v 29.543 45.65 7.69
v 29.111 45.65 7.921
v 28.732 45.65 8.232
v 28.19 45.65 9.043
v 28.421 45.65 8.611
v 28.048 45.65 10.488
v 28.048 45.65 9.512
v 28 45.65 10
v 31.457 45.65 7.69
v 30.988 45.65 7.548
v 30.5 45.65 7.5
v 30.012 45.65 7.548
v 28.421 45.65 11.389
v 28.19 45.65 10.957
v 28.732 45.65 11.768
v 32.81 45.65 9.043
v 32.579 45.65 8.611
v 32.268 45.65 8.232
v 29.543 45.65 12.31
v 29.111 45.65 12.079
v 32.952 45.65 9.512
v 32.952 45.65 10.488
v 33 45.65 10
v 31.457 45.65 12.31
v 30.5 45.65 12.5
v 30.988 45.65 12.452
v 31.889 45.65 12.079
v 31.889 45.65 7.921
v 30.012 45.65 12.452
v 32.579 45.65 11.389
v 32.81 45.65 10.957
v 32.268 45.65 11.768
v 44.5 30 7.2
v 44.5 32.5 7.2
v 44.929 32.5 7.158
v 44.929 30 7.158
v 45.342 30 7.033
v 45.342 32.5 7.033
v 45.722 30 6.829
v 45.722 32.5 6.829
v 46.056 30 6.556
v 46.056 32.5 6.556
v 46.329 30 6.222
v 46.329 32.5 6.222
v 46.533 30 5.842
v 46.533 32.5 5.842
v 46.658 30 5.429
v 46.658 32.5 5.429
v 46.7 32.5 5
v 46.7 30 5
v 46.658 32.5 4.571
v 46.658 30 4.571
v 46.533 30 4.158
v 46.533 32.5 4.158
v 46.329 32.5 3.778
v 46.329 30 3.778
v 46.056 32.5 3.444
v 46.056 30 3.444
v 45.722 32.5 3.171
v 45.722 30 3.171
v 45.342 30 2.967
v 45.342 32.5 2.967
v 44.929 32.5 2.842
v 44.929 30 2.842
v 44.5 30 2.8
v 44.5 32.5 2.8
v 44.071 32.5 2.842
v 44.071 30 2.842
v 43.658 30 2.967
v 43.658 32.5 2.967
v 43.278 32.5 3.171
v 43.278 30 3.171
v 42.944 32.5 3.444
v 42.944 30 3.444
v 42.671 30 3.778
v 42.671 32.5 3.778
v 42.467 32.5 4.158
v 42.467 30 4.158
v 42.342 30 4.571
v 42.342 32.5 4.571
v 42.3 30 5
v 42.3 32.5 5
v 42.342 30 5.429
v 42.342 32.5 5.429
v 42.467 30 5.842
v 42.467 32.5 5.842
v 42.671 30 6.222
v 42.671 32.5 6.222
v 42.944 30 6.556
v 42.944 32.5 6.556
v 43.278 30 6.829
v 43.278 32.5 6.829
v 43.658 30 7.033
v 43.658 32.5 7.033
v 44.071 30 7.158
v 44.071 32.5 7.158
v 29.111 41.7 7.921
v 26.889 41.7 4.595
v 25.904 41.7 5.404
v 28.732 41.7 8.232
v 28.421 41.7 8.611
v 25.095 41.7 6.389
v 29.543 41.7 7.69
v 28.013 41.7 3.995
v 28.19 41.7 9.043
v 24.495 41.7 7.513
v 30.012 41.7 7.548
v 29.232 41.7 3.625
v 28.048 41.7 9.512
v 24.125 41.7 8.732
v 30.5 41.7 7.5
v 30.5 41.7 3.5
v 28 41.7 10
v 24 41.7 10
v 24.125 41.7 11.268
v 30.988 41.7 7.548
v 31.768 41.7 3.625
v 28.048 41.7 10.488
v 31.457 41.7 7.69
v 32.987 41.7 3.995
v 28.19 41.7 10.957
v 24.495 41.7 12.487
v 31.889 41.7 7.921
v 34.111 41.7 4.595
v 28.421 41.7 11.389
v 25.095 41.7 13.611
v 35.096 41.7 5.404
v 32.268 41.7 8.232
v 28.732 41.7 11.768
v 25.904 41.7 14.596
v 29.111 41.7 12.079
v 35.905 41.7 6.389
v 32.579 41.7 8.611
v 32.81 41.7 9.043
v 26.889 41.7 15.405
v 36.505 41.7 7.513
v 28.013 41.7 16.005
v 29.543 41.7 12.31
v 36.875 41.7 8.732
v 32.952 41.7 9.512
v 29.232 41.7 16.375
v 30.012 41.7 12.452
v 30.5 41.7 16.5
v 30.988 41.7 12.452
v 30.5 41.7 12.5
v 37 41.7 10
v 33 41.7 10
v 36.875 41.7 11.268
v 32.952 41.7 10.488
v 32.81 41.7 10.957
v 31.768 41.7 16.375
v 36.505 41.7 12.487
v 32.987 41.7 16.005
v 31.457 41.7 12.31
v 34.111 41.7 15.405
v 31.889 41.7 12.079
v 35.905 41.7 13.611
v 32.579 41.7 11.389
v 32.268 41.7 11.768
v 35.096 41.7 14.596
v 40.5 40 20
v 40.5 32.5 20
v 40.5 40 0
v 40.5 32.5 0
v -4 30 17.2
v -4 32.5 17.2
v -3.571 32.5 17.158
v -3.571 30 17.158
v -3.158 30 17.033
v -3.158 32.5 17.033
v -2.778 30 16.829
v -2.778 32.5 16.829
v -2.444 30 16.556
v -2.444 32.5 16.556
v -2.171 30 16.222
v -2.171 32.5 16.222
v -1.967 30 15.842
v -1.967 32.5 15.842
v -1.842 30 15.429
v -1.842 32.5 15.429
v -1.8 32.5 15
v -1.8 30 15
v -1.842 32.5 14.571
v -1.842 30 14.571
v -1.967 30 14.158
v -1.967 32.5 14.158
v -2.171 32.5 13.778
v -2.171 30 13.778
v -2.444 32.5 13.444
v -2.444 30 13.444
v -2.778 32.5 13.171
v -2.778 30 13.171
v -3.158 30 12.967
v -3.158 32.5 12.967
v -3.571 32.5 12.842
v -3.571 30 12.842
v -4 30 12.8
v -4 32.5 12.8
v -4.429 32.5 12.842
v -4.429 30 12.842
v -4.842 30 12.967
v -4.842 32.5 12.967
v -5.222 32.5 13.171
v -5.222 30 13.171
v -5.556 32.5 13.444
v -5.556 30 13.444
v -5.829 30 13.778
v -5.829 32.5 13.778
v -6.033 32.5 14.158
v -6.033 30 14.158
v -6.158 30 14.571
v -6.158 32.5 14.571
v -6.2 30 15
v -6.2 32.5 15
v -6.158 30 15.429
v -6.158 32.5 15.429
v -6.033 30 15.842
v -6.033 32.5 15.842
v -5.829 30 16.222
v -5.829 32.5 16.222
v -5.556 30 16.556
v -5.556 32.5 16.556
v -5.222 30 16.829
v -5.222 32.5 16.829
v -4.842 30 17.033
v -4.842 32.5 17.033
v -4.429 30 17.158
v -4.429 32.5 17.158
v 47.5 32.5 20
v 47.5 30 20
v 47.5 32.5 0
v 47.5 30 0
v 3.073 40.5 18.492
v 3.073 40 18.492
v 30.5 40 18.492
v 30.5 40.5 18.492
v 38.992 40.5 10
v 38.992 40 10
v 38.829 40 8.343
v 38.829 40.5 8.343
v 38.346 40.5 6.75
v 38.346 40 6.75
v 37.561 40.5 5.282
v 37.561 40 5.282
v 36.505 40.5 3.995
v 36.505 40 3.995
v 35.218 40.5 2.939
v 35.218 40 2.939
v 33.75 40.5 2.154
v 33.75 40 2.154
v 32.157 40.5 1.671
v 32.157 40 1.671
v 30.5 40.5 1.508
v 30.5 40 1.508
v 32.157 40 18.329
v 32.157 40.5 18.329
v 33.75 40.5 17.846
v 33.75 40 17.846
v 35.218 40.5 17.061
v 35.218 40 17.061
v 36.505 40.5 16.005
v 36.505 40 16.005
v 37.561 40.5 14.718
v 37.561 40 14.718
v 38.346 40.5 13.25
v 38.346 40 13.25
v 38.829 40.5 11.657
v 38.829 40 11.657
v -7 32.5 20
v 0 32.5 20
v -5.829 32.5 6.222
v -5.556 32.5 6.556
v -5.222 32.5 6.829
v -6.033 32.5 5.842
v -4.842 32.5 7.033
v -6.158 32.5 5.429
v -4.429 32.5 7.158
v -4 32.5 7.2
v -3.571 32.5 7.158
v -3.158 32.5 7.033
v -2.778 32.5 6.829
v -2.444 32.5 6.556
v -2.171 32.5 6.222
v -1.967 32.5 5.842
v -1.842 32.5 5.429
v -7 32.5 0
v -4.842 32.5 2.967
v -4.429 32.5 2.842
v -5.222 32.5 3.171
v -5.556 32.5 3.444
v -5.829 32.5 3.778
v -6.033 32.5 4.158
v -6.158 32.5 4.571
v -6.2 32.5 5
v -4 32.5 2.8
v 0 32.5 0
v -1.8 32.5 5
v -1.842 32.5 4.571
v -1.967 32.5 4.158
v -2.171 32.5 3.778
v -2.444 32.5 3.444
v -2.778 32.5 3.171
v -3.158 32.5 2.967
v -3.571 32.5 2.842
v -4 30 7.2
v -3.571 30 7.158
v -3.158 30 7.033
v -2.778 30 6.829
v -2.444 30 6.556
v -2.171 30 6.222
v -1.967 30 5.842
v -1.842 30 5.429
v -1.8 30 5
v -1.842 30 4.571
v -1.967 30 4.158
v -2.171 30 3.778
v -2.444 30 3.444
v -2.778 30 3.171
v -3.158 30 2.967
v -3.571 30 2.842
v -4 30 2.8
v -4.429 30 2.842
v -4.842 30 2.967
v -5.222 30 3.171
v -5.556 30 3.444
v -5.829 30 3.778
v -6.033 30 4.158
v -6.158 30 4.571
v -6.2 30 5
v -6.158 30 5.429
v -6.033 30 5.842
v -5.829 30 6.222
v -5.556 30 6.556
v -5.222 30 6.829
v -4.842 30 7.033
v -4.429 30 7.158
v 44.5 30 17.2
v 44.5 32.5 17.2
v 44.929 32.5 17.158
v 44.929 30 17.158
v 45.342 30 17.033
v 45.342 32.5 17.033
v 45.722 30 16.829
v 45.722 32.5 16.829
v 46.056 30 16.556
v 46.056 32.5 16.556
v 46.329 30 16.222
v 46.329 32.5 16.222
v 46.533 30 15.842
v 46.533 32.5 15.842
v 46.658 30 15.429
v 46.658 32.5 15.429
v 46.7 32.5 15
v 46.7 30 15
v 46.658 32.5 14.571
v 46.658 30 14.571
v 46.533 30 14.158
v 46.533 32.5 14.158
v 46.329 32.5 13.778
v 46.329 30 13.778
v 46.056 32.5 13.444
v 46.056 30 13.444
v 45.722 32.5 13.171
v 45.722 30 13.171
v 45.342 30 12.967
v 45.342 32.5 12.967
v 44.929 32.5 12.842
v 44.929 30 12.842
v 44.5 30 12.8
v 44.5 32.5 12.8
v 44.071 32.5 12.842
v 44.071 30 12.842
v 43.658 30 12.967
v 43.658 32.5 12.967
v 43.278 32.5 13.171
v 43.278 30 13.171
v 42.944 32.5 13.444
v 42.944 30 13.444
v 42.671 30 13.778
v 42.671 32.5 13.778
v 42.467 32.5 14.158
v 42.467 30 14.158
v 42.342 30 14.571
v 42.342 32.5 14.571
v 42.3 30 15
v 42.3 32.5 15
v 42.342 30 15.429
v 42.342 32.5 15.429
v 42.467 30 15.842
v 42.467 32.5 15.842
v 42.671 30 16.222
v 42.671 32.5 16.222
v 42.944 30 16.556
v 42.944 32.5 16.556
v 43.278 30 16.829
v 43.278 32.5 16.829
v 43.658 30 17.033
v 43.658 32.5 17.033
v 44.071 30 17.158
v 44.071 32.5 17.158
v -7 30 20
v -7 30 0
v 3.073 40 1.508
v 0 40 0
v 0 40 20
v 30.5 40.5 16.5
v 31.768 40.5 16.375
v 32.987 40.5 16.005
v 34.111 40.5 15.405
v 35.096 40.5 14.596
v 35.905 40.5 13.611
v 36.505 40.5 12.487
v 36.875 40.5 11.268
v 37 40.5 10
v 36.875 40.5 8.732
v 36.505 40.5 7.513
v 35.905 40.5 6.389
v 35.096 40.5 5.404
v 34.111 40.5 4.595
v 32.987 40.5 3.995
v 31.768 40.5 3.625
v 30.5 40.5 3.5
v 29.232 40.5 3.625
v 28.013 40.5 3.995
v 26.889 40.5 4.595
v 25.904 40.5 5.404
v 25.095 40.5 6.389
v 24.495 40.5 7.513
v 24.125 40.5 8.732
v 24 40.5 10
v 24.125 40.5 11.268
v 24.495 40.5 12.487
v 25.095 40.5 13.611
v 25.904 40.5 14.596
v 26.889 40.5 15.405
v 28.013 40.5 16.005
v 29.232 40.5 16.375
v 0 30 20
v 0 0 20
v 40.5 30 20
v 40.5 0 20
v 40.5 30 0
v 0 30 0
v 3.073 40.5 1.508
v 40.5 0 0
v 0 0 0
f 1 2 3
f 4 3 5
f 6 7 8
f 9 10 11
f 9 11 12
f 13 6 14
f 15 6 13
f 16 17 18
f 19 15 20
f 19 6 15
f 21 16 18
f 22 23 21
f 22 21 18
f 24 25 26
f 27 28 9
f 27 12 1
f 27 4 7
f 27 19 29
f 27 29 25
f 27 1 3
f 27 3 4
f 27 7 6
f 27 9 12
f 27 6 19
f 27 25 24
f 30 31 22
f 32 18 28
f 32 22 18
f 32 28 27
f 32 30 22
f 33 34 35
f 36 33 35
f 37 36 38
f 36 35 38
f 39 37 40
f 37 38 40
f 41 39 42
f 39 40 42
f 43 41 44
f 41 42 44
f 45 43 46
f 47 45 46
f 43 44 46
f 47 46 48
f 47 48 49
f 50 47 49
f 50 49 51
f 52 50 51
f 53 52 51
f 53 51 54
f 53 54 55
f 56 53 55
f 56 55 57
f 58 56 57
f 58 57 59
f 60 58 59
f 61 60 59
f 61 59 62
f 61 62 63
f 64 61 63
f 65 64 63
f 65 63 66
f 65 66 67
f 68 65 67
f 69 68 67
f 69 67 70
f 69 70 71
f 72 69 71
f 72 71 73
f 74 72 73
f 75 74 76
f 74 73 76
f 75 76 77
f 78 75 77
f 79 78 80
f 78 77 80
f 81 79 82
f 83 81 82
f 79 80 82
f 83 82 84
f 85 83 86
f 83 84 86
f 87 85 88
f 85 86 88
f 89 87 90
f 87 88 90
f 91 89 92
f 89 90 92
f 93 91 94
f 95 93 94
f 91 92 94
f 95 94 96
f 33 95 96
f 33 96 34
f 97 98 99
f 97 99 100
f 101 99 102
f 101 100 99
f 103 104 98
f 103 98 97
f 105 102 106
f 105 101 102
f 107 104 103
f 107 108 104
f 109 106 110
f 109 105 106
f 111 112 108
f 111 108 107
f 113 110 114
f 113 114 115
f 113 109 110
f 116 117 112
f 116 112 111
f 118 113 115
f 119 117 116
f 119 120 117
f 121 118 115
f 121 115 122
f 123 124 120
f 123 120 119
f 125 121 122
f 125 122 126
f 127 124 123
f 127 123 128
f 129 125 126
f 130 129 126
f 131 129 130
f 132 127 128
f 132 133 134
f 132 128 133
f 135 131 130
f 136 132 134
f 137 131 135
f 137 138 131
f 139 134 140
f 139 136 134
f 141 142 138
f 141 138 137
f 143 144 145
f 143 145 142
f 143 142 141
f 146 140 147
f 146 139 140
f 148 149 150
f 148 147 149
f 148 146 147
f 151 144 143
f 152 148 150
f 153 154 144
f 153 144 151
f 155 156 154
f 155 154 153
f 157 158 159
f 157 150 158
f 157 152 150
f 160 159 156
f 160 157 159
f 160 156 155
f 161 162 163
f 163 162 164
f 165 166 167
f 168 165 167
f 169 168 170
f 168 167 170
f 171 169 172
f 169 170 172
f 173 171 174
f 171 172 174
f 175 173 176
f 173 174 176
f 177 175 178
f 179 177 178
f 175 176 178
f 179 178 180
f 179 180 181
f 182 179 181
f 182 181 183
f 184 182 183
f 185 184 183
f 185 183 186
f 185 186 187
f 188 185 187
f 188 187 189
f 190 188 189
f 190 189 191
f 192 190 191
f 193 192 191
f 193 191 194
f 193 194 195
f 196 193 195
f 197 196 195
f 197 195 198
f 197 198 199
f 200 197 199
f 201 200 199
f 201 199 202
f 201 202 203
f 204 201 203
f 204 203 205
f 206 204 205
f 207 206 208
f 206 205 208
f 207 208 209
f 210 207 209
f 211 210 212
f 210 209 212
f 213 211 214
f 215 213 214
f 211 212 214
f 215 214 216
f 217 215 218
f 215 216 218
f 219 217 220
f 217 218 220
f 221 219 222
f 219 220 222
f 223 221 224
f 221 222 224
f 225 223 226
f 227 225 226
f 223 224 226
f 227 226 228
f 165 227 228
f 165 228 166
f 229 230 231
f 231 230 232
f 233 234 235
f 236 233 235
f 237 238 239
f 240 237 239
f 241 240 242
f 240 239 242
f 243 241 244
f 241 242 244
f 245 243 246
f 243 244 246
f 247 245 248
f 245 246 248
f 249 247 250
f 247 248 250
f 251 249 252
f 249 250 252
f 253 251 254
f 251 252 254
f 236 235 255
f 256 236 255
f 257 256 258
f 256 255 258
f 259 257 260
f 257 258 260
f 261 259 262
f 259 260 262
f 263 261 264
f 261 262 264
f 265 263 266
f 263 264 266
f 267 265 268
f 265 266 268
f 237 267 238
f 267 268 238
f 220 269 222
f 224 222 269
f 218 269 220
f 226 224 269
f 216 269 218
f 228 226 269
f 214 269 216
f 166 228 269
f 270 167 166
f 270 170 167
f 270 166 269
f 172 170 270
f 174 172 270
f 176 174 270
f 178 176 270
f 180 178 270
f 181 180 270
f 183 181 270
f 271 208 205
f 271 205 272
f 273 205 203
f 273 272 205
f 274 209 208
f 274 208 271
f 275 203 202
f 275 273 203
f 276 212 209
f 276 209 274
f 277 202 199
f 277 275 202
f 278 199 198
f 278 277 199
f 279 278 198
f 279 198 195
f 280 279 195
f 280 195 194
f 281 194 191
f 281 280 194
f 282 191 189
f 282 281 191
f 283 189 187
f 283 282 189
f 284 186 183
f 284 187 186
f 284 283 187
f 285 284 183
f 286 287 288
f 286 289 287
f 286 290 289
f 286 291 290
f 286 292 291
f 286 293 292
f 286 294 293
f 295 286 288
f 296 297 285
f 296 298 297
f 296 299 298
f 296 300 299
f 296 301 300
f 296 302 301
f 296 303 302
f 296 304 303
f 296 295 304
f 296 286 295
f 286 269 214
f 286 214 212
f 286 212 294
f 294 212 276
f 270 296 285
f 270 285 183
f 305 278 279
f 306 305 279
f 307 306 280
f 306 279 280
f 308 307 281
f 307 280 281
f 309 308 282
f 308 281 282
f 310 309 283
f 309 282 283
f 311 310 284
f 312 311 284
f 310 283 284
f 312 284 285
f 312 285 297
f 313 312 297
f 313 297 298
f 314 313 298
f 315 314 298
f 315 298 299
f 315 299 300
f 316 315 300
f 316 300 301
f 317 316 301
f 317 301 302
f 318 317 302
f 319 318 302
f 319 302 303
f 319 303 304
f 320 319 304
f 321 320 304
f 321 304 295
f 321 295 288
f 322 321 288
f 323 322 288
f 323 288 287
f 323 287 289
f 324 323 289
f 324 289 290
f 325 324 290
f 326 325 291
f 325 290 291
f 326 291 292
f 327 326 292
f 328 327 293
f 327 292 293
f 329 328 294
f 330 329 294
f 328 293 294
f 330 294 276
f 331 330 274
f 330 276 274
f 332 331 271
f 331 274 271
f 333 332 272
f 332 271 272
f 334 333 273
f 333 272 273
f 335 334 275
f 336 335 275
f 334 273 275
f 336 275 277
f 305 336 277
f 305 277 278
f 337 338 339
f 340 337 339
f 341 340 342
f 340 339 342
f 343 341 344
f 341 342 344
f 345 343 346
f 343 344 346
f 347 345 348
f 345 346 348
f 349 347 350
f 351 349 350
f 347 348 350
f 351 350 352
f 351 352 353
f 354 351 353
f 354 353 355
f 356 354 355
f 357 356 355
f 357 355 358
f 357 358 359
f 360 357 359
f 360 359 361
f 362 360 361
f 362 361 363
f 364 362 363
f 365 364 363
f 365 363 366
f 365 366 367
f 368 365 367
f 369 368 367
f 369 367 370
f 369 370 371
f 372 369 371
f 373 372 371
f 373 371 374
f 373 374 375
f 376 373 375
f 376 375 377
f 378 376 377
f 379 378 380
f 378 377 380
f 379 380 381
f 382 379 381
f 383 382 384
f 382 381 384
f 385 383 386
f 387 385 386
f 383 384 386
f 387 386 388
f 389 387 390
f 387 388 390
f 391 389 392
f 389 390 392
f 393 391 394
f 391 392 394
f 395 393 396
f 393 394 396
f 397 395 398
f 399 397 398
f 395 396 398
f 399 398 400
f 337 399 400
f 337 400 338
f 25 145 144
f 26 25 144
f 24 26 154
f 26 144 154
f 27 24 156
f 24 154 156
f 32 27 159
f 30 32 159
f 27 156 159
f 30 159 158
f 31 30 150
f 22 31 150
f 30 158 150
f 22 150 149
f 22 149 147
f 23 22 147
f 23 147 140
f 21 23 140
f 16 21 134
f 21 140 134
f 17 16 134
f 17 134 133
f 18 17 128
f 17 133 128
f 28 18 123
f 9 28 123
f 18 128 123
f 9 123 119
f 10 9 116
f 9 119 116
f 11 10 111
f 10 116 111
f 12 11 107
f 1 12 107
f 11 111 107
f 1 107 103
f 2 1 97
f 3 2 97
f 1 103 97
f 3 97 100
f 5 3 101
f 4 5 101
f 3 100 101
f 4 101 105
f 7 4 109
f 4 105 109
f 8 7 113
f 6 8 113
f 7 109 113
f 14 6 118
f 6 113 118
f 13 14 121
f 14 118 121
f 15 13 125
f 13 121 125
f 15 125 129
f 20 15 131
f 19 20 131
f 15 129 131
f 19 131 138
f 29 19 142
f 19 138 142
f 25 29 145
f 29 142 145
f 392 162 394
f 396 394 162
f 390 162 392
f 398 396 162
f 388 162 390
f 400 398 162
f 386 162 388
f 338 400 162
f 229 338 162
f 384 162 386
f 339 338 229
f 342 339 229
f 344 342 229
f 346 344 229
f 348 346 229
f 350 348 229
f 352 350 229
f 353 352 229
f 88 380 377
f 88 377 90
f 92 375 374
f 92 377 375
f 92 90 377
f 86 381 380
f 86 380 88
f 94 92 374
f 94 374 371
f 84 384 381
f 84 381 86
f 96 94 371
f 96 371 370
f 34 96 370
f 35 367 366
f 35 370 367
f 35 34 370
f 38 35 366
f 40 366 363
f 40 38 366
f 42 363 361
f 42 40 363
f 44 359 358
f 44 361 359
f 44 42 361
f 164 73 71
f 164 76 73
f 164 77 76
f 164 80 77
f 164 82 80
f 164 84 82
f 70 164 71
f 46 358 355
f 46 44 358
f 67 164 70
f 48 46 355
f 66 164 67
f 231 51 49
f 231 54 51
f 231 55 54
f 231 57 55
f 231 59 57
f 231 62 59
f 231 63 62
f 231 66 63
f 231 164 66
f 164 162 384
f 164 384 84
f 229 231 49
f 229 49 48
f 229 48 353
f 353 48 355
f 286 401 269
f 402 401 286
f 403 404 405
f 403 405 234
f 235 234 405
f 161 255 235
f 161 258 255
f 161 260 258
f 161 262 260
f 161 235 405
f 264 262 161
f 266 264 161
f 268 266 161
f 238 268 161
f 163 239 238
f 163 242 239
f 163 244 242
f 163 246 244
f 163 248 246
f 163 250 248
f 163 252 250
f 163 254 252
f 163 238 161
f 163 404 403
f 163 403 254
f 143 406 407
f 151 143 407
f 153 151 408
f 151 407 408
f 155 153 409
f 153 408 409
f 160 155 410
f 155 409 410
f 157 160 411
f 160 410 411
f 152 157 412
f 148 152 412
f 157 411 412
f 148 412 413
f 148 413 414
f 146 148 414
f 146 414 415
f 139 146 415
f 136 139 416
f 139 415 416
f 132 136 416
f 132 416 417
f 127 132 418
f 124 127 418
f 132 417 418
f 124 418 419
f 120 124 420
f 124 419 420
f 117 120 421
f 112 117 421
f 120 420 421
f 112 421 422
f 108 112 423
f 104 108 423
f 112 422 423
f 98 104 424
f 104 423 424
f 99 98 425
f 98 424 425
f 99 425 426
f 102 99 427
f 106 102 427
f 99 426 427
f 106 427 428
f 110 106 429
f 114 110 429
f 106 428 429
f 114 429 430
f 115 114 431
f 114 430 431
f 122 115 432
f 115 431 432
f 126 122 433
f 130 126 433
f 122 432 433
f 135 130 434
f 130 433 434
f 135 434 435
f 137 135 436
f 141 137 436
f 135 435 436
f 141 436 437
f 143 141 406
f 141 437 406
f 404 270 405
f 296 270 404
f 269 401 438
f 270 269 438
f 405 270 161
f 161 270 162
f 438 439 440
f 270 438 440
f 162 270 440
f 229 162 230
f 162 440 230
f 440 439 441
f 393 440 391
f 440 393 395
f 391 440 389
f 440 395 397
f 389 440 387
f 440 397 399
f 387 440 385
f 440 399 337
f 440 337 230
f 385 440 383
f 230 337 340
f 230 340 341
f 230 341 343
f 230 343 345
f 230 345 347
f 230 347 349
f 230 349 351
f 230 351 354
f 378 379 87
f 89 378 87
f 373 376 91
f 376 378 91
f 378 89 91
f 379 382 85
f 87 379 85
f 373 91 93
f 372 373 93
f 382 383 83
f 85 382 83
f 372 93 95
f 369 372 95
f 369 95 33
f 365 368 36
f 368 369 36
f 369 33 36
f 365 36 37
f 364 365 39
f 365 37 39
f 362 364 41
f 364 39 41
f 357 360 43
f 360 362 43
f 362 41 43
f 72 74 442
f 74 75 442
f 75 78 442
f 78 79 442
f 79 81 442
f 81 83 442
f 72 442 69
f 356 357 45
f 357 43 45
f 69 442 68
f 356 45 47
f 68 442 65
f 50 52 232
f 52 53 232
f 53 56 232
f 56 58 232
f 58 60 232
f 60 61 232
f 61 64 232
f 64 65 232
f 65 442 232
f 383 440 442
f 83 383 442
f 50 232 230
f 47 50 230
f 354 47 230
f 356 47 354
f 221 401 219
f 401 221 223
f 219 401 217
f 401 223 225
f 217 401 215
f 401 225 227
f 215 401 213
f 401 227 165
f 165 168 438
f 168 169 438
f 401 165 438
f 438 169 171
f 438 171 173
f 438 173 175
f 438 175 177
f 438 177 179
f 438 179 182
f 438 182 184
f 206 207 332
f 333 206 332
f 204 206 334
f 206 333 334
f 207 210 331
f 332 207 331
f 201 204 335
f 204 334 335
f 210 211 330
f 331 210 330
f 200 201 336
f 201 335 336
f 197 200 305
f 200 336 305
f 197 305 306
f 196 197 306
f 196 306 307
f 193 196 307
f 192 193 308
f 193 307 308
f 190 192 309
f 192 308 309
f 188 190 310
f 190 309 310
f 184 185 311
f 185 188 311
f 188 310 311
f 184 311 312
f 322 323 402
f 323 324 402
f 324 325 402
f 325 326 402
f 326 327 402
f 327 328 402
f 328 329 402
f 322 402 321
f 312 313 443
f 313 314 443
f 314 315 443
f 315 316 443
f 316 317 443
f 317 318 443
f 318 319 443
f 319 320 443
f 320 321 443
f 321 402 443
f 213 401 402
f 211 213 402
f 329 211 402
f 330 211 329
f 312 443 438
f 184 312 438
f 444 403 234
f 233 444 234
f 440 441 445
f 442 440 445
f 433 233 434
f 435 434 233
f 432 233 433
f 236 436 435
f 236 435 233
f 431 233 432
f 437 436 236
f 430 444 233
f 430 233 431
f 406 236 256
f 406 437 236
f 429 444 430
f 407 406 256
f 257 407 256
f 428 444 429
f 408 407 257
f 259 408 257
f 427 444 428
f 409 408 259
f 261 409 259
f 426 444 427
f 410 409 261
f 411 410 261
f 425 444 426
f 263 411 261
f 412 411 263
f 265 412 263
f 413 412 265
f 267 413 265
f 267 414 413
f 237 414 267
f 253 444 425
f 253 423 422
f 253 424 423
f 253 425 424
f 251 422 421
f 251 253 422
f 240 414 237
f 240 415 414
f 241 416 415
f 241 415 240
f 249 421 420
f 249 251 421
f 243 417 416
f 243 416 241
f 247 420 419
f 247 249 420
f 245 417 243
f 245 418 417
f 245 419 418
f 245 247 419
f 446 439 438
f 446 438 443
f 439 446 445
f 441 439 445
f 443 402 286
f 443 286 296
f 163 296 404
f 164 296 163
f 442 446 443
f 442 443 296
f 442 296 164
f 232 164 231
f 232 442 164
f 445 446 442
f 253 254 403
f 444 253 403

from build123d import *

# Parameters (mm, degrees)
SKETCH_1_W          = 40.5
SKETCH_1_H          = 20
EXTRUDE_1_DEPTH     = 30
SKETCH_2_W          = 54.5
SKETCH_2_H          = 20
EXTRUDE_2_DEPTH     = 2.5
SKETCH_3_W          = 40.5
SKETCH_3_H          = 20
EXTRUDE_3_DEPTH     = 7.5
EXTRUDE_4_DEPTH     = 0.5
SKETCH_5_R          = 6.5
EXTRUDE_5_DEPTH     = 1.2
SKETCH_6_R          = 2.5
EXTRUDE_6_DEPTH     = 3.95
SKETCH_7_R          = 2.2
CUT_EXTRUDE_1_DEPTH = 3.95


with BuildPart() as part:
    # 草图1 → 凸台-拉伸1 (new body)
    with BuildSketch(Plane(origin=(0, 0, 0), x_dir=(1, 0, 0), z_dir=(0, 1, 0))):
        with Locations((20.25, -10)):
            Rectangle(SKETCH_1_W, SKETCH_1_H)
    extrude(amount=EXTRUDE_1_DEPTH)

    # 草图2 → 凸台-拉伸2 (add)
    with BuildSketch(Plane(origin=(0, 30, 0), x_dir=(1, 0, 0), z_dir=(0, 1, 0))):
        with Locations((20.25, -10)):
            Rectangle(SKETCH_2_W, SKETCH_2_H)
    extrude(amount=EXTRUDE_2_DEPTH)

    # 草图3 → 凸台-拉伸3 (add)
    with BuildSketch(Plane(origin=(0, 32.5, 0), x_dir=(1, 0, 0), z_dir=(0, 1, 0))):
        with Locations((20.25, -10)):
            Rectangle(SKETCH_3_W, SKETCH_3_H)
    extrude(amount=EXTRUDE_3_DEPTH)

    # 草图4 → 凸台-拉伸4 (add)
    with BuildSketch(Plane(origin=(0, 40, 0), x_dir=(1, 0, 0), z_dir=(0, 1, 0))):
        with BuildLine():
            Line((3.073030725, -18.492151614), (30.5, -18.492151614))
            ThreePointArc((30.5, -18.492151614), (22.007848386, -10), (30.5, -1.507848386))
            Line((30.5, -1.507848386), (3.073030725, -1.507848386))
            Line((3.073030725, -1.507848386), (3.073030725, -18.492151614))
        make_face()
        with BuildLine():
            Line((30.5, -18.492151614), (30.5, -10))
            Line((30.5, -10), (30.5, -1.507848386))
            ThreePointArc((30.5, -1.507848386), (22.007848386, -10), (30.5, -18.492151614))
        make_face()
        with BuildLine():
            Line((30.5, -1.507848386), (30.5, -10))
            Line((30.5, -10), (38.992151614, -10))
            ThreePointArc((38.992151614, -10), (36.504857993, -3.995142007), (30.5, -1.507848386))
        make_face()
        with BuildLine():
            Line((38.992151614, -10), (30.5, -10))
            Line((30.5, -10), (30.5, -18.492151614))
            ThreePointArc((30.5, -18.492151614), (36.504857993, -16.004857993), (38.992151614, -10))
        make_face()
    extrude(amount=EXTRUDE_4_DEPTH)

    # 草图5 → 凸台-拉伸5 (add)
    with BuildSketch(Plane(origin=(0, 40.5, 0), x_dir=(1, 0, 0), z_dir=(0, 1, 0))):
        with Locations(Location((30.5, -10, 0), (0, 0, 270))):
            Circle(SKETCH_5_R)
    extrude(amount=EXTRUDE_5_DEPTH)

    # 草图6 → 凸台-拉伸6 (add)
    with BuildSketch(Plane(origin=(0, 41.7, 0), x_dir=(1, 0, 0), z_dir=(0, 1, 0))):
        with Locations(Location((30.5, -10, 0), (0, 0, 270))):
            Circle(SKETCH_6_R)
    extrude(amount=EXTRUDE_6_DEPTH)

    # 草图7 → 切除-拉伸1 (cut)
    with BuildSketch(Plane(origin=(0, 32.5, 0), x_dir=(1, 0, 0), z_dir=(0, 1, 0))):
        with Locations(Location((44.5, -5, 0), (0, 0, 270))):
            Circle(SKETCH_7_R)
        with Locations(Location((44.5, -15, 0), (0, 0, 270))):
            Circle(SKETCH_7_R)
        with Locations(Location((-4, -5, 0), (0, 0, 270))):
            Circle(SKETCH_7_R)
        with Locations(Location((-4, -15, 0), (0, 0, 270))):
            Circle(SKETCH_7_R)
    extrude(amount=-CUT_EXTRUDE_1_DEPTH, mode=Mode.SUBTRACT)


solid = part.part
